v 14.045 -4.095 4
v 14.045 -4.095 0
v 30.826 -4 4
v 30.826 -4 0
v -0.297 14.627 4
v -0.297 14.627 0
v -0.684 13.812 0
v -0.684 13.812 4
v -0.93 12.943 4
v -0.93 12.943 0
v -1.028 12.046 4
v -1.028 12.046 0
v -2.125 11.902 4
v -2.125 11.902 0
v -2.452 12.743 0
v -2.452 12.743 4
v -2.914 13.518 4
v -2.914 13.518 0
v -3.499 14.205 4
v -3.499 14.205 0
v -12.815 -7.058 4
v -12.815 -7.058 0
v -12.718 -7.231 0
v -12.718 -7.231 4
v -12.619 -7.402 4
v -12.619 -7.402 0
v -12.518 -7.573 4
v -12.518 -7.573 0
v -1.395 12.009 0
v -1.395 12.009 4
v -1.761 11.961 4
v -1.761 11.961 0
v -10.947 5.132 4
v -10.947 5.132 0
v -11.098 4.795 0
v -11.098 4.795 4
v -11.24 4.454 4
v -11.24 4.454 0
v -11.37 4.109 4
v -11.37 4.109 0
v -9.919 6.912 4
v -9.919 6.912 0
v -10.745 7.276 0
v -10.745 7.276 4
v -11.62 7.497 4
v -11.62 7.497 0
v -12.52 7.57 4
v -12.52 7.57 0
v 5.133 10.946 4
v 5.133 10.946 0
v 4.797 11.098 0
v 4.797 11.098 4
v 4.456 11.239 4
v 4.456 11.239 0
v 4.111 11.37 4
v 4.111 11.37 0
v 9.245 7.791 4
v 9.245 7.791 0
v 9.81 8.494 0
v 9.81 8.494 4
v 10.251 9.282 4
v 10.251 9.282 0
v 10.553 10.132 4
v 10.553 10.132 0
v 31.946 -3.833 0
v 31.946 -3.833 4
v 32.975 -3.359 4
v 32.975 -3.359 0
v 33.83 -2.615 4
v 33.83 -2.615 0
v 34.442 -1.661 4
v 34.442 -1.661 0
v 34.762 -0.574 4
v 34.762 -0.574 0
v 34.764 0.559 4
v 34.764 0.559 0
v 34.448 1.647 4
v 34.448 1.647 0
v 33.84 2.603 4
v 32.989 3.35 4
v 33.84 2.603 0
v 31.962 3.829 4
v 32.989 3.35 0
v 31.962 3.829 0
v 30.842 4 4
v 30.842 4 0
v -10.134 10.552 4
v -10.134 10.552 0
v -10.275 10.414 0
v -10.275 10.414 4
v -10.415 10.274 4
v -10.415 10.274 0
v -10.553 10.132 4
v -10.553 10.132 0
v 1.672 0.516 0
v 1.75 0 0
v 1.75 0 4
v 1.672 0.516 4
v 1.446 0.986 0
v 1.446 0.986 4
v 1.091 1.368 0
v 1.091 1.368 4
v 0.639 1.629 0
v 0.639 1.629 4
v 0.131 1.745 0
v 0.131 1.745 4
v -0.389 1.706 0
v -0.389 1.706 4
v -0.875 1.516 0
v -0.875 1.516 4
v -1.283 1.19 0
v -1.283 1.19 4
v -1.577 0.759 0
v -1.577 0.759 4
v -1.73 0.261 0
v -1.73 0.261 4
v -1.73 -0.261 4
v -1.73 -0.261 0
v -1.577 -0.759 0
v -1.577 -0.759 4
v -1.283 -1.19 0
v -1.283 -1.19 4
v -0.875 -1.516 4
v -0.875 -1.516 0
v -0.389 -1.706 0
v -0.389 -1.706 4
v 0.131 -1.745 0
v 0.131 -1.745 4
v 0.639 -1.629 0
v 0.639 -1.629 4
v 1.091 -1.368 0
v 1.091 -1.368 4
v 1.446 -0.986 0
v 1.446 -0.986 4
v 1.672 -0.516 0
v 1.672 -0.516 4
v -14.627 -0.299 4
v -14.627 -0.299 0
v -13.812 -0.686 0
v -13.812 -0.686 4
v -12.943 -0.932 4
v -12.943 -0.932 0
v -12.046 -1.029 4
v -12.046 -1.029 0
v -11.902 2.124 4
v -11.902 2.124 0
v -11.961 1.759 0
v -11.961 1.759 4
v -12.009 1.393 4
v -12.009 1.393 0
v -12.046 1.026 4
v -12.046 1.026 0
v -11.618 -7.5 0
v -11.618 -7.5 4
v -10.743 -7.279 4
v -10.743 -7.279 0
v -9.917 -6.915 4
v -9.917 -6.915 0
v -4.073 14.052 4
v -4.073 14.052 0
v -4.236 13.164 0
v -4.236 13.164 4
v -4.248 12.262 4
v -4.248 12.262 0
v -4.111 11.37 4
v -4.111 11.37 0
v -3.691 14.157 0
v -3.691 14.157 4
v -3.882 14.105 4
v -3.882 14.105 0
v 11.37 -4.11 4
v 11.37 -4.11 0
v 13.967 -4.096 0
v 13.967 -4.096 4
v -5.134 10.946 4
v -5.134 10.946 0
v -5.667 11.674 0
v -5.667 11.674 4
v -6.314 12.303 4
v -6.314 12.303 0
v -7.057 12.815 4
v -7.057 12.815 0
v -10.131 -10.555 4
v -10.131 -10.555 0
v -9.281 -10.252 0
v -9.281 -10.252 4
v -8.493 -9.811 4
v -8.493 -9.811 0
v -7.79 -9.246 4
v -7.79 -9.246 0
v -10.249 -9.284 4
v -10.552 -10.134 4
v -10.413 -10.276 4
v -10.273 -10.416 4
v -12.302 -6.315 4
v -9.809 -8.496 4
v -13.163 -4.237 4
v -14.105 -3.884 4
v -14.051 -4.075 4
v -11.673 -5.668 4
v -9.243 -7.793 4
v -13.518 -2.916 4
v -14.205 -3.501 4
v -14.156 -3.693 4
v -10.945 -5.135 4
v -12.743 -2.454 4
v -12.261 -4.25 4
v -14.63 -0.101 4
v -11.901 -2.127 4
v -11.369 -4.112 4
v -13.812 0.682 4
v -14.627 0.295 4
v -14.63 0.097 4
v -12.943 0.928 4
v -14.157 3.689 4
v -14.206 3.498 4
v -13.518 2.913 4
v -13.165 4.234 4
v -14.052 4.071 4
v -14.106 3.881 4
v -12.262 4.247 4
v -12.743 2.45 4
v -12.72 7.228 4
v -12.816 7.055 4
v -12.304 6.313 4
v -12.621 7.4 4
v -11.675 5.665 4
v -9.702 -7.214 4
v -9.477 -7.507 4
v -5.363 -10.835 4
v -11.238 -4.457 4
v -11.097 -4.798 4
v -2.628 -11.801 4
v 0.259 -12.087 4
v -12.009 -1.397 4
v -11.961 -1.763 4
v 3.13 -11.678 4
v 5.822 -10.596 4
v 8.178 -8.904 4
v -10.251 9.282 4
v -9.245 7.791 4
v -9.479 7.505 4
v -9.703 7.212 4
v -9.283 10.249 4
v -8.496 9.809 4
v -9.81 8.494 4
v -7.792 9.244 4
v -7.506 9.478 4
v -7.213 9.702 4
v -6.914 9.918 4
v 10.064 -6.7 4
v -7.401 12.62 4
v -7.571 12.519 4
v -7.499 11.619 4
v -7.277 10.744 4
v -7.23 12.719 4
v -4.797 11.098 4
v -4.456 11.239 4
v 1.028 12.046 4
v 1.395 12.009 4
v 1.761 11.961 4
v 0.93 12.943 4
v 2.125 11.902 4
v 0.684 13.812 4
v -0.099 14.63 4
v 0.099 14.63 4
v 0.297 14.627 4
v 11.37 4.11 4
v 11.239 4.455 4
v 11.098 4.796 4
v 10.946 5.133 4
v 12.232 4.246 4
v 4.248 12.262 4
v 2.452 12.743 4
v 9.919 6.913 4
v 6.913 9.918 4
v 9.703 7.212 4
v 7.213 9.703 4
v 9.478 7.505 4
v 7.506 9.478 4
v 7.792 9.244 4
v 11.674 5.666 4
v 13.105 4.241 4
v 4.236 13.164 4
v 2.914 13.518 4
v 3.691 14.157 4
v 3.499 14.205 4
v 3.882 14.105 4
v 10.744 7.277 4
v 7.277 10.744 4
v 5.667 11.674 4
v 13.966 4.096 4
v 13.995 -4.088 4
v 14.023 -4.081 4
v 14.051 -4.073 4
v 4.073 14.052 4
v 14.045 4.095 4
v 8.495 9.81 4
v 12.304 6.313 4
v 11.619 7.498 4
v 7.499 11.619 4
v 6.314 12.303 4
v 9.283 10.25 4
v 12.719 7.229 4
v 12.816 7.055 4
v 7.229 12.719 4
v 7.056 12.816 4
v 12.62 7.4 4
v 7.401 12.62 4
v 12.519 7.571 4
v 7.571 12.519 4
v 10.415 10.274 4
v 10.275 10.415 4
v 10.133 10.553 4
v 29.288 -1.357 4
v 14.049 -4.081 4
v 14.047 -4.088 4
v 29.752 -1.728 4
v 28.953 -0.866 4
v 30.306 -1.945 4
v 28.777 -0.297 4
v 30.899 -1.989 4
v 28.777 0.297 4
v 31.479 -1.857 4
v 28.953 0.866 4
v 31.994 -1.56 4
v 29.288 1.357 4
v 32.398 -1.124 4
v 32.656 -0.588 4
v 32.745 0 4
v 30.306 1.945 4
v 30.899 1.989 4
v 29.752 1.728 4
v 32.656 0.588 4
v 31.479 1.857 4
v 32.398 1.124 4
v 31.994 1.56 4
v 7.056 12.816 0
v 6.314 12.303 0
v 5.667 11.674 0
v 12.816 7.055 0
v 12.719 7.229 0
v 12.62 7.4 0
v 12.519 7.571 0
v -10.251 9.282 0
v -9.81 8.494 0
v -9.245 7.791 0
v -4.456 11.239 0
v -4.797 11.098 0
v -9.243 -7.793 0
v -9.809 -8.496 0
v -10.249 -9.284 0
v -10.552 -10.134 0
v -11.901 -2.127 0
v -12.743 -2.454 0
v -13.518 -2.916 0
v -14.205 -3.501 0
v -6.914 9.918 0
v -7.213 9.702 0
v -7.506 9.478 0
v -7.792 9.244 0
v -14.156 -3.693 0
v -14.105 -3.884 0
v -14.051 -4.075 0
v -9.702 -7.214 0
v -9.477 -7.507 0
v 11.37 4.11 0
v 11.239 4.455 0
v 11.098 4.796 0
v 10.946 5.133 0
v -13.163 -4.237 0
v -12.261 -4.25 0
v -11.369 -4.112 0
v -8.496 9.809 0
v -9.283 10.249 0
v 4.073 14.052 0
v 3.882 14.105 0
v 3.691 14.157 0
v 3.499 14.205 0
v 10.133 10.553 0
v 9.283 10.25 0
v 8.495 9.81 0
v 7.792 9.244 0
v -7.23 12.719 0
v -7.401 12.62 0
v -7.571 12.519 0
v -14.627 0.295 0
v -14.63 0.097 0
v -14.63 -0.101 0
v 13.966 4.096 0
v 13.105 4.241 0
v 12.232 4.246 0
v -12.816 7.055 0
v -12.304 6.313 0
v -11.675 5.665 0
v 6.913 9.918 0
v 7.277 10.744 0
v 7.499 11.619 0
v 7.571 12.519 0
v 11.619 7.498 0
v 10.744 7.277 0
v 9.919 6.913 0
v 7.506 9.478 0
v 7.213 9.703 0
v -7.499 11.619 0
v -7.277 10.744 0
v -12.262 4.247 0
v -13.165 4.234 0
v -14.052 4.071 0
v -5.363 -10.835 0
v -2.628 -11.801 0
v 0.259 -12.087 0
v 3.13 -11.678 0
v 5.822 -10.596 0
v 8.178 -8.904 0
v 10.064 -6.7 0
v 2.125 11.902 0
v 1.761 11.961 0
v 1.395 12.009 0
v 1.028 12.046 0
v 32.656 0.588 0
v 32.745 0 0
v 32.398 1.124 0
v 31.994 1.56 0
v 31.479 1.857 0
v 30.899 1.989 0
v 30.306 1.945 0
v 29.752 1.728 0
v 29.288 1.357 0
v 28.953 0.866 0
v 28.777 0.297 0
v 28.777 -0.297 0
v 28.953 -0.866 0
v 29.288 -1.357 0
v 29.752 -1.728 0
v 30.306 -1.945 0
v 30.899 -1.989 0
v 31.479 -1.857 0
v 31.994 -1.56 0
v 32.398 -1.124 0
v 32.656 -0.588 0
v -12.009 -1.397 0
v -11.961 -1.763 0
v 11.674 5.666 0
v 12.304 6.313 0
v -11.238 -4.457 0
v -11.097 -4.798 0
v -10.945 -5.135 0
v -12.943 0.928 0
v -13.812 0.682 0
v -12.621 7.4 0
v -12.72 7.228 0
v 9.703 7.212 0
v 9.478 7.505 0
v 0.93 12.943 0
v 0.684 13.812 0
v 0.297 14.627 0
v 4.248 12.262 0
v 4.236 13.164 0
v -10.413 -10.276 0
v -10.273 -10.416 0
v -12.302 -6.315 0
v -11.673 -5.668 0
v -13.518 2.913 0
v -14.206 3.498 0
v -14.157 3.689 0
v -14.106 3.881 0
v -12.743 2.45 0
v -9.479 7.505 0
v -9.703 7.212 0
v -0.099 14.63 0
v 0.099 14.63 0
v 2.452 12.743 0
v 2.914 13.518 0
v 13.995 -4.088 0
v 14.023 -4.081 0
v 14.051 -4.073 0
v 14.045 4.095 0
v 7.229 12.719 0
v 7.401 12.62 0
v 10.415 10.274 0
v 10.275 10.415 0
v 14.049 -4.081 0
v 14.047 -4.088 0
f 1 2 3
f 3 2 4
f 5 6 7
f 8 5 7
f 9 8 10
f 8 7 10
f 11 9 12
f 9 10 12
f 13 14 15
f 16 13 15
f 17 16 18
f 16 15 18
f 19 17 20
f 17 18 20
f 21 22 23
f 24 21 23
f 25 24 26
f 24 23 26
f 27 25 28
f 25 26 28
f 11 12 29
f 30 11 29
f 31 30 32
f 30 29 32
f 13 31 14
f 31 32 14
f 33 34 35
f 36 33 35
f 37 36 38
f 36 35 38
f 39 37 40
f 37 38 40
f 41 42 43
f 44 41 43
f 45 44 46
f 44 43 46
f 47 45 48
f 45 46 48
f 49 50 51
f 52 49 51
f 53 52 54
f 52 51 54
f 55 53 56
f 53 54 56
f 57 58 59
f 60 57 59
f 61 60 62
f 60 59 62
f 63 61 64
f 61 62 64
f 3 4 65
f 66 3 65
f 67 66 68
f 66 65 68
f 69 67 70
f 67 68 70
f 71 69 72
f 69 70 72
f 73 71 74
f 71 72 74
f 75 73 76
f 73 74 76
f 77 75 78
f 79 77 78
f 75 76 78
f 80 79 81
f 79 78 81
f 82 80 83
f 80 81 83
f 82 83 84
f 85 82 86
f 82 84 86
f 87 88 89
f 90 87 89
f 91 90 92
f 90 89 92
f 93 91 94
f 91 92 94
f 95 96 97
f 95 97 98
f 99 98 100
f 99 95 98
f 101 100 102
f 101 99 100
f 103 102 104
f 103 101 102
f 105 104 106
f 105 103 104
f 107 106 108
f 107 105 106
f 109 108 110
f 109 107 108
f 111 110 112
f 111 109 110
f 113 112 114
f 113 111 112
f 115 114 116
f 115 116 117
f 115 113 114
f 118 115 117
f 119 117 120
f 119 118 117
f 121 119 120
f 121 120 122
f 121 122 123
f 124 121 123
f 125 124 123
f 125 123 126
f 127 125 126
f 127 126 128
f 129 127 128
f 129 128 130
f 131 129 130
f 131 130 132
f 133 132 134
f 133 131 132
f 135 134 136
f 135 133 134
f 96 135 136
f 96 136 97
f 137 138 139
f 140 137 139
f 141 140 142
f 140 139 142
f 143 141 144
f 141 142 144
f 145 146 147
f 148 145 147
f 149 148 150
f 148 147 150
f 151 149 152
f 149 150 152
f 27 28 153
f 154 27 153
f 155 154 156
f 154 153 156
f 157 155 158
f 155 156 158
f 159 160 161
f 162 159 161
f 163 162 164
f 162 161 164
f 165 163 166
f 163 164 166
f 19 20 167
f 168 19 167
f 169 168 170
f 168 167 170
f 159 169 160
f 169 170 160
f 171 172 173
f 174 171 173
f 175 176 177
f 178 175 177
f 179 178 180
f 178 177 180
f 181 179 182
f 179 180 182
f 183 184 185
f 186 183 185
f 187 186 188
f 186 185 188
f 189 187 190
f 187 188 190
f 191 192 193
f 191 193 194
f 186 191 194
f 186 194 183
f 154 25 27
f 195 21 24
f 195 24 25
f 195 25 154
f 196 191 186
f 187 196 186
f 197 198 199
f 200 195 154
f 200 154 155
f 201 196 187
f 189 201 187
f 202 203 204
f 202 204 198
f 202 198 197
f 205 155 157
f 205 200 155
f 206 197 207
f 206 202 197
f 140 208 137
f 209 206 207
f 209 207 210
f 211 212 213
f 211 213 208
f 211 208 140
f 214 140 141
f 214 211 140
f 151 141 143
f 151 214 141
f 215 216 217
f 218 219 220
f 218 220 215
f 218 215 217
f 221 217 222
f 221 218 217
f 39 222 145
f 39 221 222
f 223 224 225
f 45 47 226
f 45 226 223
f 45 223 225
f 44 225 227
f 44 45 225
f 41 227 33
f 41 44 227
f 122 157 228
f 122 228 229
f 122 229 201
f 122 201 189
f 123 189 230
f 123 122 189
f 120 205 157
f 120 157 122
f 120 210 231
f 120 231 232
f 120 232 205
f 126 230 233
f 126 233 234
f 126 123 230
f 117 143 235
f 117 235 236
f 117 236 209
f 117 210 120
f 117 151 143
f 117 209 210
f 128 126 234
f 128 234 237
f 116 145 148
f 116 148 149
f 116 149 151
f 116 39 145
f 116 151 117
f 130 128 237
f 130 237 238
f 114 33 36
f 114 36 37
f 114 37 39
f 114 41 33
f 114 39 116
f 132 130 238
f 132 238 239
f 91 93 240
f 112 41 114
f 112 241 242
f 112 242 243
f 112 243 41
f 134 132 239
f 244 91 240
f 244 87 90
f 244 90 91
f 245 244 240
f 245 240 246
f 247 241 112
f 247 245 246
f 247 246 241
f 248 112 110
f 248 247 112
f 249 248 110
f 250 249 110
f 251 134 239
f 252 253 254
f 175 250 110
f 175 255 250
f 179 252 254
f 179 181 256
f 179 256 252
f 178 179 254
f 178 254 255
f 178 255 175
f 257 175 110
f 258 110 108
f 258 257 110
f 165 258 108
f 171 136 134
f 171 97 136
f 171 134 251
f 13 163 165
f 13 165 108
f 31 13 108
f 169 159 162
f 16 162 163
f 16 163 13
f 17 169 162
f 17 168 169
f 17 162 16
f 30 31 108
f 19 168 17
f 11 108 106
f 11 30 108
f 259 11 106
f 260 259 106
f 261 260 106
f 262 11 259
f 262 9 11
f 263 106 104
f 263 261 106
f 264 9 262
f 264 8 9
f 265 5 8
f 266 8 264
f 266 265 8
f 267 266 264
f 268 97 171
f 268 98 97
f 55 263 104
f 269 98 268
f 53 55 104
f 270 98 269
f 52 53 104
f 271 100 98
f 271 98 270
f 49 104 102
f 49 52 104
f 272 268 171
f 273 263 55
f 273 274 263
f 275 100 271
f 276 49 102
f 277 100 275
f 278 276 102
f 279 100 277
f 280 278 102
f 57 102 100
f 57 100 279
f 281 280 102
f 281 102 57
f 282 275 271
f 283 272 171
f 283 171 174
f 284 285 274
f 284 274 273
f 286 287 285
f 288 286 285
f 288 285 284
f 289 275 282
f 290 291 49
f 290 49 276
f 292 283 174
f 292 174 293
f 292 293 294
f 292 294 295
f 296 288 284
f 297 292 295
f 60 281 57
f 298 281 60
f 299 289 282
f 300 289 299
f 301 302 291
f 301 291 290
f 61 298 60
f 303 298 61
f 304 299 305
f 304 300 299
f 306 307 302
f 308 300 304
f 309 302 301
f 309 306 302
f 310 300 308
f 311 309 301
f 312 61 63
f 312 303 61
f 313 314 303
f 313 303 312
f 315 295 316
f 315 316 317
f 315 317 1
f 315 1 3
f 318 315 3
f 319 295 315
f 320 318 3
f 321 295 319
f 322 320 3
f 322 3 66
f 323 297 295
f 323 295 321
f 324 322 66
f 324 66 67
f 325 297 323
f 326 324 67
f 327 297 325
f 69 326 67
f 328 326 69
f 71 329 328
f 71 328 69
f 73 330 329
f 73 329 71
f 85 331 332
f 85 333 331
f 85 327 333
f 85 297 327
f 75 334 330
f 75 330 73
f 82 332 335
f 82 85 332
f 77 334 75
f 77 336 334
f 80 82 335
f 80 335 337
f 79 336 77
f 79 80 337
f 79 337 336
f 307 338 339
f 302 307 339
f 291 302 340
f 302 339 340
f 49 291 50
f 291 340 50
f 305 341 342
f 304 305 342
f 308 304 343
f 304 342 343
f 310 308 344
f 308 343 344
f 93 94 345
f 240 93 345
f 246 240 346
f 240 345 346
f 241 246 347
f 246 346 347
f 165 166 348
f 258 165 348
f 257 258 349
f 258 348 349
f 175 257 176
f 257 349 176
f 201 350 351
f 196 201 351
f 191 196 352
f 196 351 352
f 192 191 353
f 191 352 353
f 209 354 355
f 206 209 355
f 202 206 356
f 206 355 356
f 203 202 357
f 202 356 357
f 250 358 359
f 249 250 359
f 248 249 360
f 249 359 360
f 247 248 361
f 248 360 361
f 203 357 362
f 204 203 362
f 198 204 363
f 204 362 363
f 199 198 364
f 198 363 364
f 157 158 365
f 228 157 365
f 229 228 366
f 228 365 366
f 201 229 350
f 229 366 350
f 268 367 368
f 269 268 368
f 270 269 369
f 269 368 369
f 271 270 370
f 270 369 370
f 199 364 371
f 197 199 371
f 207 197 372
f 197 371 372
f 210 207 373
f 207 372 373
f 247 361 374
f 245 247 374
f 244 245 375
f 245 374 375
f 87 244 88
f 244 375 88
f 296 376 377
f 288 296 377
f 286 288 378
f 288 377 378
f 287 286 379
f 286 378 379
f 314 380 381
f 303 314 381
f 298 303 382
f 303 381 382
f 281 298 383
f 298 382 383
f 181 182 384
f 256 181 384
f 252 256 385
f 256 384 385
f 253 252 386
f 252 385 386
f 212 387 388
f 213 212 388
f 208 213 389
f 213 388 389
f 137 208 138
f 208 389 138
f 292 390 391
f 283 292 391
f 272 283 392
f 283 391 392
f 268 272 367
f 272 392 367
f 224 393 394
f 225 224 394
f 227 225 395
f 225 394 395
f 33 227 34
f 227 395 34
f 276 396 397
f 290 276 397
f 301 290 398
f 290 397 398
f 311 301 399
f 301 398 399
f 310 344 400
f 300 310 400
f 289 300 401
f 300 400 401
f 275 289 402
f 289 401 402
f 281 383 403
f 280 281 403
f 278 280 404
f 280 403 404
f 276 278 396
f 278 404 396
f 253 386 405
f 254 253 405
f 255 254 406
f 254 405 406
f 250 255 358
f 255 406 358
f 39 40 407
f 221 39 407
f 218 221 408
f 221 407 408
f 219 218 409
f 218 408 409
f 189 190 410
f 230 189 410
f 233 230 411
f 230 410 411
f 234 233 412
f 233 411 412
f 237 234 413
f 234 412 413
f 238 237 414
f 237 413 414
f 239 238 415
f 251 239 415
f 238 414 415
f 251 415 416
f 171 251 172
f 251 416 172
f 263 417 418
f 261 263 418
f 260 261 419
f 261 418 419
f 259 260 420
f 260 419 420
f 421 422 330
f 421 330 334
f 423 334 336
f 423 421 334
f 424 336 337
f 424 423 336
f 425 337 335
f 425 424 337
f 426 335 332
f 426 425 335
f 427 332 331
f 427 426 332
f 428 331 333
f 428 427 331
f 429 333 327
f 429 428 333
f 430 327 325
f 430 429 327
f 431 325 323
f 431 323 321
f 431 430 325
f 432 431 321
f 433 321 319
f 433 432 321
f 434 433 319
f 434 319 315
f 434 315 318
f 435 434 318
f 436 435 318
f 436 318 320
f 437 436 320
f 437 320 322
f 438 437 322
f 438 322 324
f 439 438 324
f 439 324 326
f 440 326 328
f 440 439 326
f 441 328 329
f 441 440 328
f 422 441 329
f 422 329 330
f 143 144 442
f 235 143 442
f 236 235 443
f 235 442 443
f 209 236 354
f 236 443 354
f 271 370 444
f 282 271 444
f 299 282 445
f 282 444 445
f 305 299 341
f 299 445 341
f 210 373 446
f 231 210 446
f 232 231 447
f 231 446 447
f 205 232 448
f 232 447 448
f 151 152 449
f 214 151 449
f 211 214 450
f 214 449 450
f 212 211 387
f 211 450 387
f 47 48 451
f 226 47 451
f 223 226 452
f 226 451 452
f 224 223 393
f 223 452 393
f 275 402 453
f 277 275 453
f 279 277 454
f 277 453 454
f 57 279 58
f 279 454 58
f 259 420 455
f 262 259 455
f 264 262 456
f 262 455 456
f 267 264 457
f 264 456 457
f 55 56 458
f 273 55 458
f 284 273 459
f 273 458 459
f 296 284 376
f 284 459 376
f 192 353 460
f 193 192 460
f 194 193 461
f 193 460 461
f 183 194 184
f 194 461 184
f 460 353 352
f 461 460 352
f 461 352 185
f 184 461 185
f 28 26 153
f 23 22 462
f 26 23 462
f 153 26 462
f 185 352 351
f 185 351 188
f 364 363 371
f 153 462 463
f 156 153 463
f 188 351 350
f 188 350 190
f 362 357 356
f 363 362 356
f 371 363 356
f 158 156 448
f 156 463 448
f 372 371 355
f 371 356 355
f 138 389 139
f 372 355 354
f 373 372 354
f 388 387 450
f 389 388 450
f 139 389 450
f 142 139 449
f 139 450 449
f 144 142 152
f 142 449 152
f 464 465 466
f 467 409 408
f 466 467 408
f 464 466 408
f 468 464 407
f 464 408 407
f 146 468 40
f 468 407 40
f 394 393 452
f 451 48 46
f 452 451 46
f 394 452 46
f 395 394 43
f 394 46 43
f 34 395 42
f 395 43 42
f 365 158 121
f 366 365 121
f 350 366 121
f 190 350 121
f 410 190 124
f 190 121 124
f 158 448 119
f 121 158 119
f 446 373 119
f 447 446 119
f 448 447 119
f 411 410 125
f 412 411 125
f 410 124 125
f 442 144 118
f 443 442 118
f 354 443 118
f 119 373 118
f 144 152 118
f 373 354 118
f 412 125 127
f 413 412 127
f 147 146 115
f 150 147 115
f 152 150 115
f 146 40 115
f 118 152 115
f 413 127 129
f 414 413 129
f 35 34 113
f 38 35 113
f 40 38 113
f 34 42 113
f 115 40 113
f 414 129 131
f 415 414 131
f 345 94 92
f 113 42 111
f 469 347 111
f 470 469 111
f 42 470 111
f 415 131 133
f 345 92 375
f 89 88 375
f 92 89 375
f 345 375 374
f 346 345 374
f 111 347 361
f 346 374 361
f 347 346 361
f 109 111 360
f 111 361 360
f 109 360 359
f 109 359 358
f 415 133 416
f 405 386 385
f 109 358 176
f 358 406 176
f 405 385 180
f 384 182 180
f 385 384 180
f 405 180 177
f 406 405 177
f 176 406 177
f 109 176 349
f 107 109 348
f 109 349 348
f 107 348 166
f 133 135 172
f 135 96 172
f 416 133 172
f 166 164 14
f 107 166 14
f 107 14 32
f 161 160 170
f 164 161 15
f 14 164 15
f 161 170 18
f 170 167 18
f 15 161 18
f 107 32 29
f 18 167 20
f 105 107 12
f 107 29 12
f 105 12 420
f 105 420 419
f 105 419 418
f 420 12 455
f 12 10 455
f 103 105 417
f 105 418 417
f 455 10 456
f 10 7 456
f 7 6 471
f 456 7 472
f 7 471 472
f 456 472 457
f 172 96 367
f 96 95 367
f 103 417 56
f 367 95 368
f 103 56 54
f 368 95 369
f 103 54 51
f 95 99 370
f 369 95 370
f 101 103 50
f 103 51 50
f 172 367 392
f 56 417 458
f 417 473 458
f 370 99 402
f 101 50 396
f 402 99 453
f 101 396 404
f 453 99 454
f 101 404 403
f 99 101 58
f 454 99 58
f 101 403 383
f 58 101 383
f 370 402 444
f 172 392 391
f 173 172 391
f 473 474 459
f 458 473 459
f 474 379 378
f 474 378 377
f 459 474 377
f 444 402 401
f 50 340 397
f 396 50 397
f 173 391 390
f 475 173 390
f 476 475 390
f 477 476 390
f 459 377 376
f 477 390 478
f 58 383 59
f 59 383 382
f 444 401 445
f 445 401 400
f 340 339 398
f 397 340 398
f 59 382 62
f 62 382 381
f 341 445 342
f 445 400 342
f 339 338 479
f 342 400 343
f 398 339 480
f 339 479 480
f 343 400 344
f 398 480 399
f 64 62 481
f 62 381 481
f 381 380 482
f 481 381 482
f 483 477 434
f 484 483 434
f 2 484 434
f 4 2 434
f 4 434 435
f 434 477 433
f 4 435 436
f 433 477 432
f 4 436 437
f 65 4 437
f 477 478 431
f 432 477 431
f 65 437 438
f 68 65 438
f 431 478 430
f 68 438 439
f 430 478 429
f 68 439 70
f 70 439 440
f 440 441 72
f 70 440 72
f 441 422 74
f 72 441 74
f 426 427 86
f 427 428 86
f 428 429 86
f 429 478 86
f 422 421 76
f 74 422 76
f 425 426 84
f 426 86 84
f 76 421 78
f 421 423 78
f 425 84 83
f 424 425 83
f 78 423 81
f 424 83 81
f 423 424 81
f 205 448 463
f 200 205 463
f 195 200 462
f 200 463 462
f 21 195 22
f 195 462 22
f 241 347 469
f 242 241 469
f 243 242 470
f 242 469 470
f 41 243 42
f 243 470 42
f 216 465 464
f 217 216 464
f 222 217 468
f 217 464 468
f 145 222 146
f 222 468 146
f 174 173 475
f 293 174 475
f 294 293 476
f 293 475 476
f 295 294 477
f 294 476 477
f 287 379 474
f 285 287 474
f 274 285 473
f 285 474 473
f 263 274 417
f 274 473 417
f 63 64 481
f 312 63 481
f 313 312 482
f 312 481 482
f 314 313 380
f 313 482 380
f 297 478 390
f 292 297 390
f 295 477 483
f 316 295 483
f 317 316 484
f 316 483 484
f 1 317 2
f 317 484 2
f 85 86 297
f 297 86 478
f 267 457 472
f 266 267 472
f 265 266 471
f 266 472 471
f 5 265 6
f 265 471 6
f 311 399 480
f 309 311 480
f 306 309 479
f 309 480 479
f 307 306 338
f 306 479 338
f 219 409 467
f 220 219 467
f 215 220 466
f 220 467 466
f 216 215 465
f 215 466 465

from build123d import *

# Parameters (mm, degrees)
SKETCH1_R           = 12.09
SKETCH1_R_2         = 1.75
SKETCH1_R_3         = 1.995
BOSS_EXTRUDE1_DEPTH = 4


with BuildPart() as part:
    # Sketch1 → Boss-Extrude1 (new body)
    # profile 1 of 22: a face of its own
    with BuildSketch(Plane.XY):
        Circle(SKETCH1_R)
        Circle(SKETCH1_R_2, mode=Mode.SUBTRACT)
    # profile 2 of 22: a face of its own
    with BuildSketch(Plane.XY):
        with BuildLine():
            ThreePointArc((14.051469909, -4.073462091), (14.048317136, -4.084321933), (14.04515597, -4.095179336))
            Line((14.04515597, -4.095179336), (30.82582707, -3.999919373))
            ThreePointArc((30.82582707, -3.999919373), (34.803112279, -0.008027822), (30.841914591, 3.999828048))
            Line((30.841914591, 3.999828048), (14.04515597, 4.095179336))
            ThreePointArc((14.04515597, 4.095179336), (14.128586435, 3.797360314), (14.205702589, 3.497844187))
            ThreePointArc((14.205702589, 3.497844187), (14.50484412, 1.909554151), (14.626965513, 0.297959519))
            ThreePointArc((14.626965513, 0.297959519), (14.629241359, 0.148987485), (14.63, 0))
            ThreePointArc((14.63, 0), (14.629241116, -0.149011314), (14.626964543, -0.298007168))
            ThreePointArc((14.626964543, -0.298007168), (14.504858624, -1.909443973), (14.20576712, -3.497582099))
            ThreePointArc((14.20576712, -3.497582099), (14.131552306, -3.786308154), (14.051469909, -4.073462091))
        make_face()
        with Locations((30.75, 0)):
            Circle(SKETCH1_R_3, mode=Mode.SUBTRACT)
    # profile 3 of 22: a face of its own
    with BuildSketch(Plane.XY):
        with BuildLine():
            ThreePointArc((14.205702589, 3.497844187), (14.128586435, 3.797360314), (14.04515597, 4.095179336))
            Line((14.04515597, 4.095179336), (13.966164937, 4.095627749))
            Line((13.966164937, 4.095627749), (11.369827915, 4.11036655))
            ThreePointArc((11.369827915, 4.11036655), (11.678097516, 3.128919686), (11.901816808, 2.124819208))
            ThreePointArc((11.901816808, 2.124819208), (13.1403578, 2.666023245), (14.205702589, 3.497844187))
        make_face()
    # profile 4 of 22: a face of its own
    with BuildSketch(Plane.XY):
        with BuildLine():
            ThreePointArc((-12.517636695, -7.572692492), (-11.175984377, -7.407777173), (-9.917325106, -6.914821961))
            ThreePointArc((-9.917325106, -6.914821961), (-10.469253219, -6.046721181), (-10.945386333, -5.134843524))
            ThreePointArc((-10.945386333, -5.134843524), (-12.001489862, -5.978375477), (-12.815033037, -7.057749518))
            ThreePointArc((-12.815033037, -7.057749518), (-12.668951436, -7.31673216), (-12.517636695, -7.572692492))
        make_face()
    # profile 5 of 22: a face of its own
    with BuildSketch(Plane.XY):
        with BuildLine():
            ThreePointArc((-14.051145033, -4.074582586), (-12.712516328, -4.262616236), (-11.369129658, -4.112297512))
            ThreePointArc((-11.369129658, -4.112297512), (-11.677558471, -3.130930876), (-11.901445615, -2.126897335))
            ThreePointArc((-11.901445615, -2.126897335), (-13.139881298, -2.668425004), (-14.205038564, -3.500539874))
            ThreePointArc((-14.205038564, -3.500539874), (-14.13100701, -3.788342761), (-14.051145033, -4.074582586))
        make_face()
    # profile 6 of 22: a face of its own
    with BuildSketch(Plane.XY):
        with BuildLine():
            ThreePointArc((-14.626950262, -0.298707293), (-13.382615157, -0.826868574), (-12.046093246, -1.029435529))
            ThreePointArc((-12.046093246, -1.029435529), (-12.089999882, -0.001686428), (-12.046379968, 1.026074882))
            ThreePointArc((-12.046379968, 1.026074882), (-13.382791491, 0.823465153), (-14.62701917, 0.295313712))
            ThreePointArc((-14.62701917, 0.295313712), (-14.629999902, -0.00169714), (-14.626950262, -0.298707293))
        make_face()
    # profile 7 of 22: a face of its own
    with BuildSketch(Plane.XY):
        with BuildLine():
            ThreePointArc((-14.205774364, 3.497552675), (-13.140565234, 2.66528054), (-11.902026335, 2.123645243))
            ThreePointArc((-11.902026335, 2.123645243), (-11.678416405, 3.127729251), (-11.370260409, 4.109170017))
            ThreePointArc((-11.370260409, 4.109170017), (-12.71360248, 4.259309779), (-14.052145793, 4.071129894))
            ThreePointArc((-14.052145793, 4.071129894), (-14.131870386, 3.78512079), (-14.205774364, 3.497552675))
        make_face()
    # profile 8 of 22: a face of its own
    with BuildSketch(Plane.XY):
        with BuildLine():
            ThreePointArc((-9.919135011, 6.912225448), (-11.177872267, 7.404913556), (-12.519533027, 7.569556974))
            ThreePointArc((-12.519533027, 7.569556974), (-12.670533379, 7.313992337), (-12.816317544, 7.055416686))
            ThreePointArc((-12.816317544, 7.055416686), (-12.00284137, 5.975783406), (-10.94671211, 5.132016561))
            ThreePointArc((-10.94671211, 5.132016561), (-10.470825179, 6.043998682), (-9.919135011, 6.912225448))
        make_face()
    # profile 9 of 22: a face of its own
    with BuildSketch(Plane.XY):
        with BuildLine():
            ThreePointArc((-7.791898403, 9.244155952), (-8.880242473, 10.045843984), (-10.13359017, 10.552120653))
            ThreePointArc((-10.13359017, 10.552120653), (-10.345575707, 10.344368676), (-10.553302948, 10.1323589))
            ThreePointArc((-10.553302948, 10.1323589), (-10.04699158, 8.878969486), (-9.245249077, 7.790601357))
            ThreePointArc((-9.245249077, 7.790601357), (-8.549520677, 8.54832125), (-7.791898403, 9.244155952))
        make_face()
    # profile 10 of 22: a face of its own
    with BuildSketch(Plane.XY):
        with BuildLine():
            ThreePointArc((-5.133551517, 10.945992364), (-5.977311447, 12.002061971), (-7.05691548, 12.815492339))
            ThreePointArc((-7.05691548, 12.815492339), (-7.315469666, 12.669680484), (-7.571012334, 12.518652972))
            ThreePointArc((-7.571012334, 12.518652972), (-7.40634855, 11.176941958), (-6.913615931, 9.918165897))
            ThreePointArc((-6.913615931, 9.918165897), (-6.045466706, 10.469977665), (-5.133551517, 10.945992364))
        make_face()
    # profile 11 of 22: a face of its own
    with BuildSketch(Plane.XY):
        with BuildLine():
            ThreePointArc((-2.125311093, 11.901728982), (-2.666957342, 13.14020836), (-3.499215334, 14.205364904))
            ThreePointArc((-3.499215334, 14.205364904), (-3.786765286, 14.131429817), (-4.072755654, 14.051674682))
            ThreePointArc((-4.072755654, 14.051674682), (-4.260931239, 12.713077321), (-4.110760617, 11.369685446))
            ThreePointArc((-4.110760617, 11.369685446), (-3.129363382, 11.677978627), (-2.125311093, 11.901728982))
        make_face()
    # profile 12 of 22: a face of its own
    with BuildSketch(Plane.XY):
        with BuildLine():
            ThreePointArc((1.027754616, 12.046236775), (0.825159863, 13.382704508), (0.296996585, 14.626985097))
            ThreePointArc((0.296996585, 14.626985097), (0, 14.63), (-0.296996585, 14.626985097))
            ThreePointArc((-0.296996585, 14.626985097), (-0.825159863, 13.382704508), (-1.027754616, 12.046236775))
            ThreePointArc((-1.027754616, 12.046236775), (0, 12.09), (1.027754616, 12.046236775))
        make_face()
    # profile 13 of 22: a face of its own
    with BuildSketch(Plane.XY):
        with BuildLine():
            ThreePointArc((4.110717434, 11.369701059), (4.260994095, 12.713043392), (4.072942889, 14.051620413))
            ThreePointArc((4.072942889, 14.051620413), (3.786710214, 14.131444574), (3.498915331, 14.2054388))
            ThreePointArc((3.498915331, 14.2054388), (2.666773966, 13.14023428), (2.125244746, 11.901740829))
            ThreePointArc((2.125244746, 11.901740829), (3.129308654, 11.677993293), (4.110717434, 11.369701059))
        make_face()
    # profile 14 of 22: a face of its own
    with BuildSketch(Plane.XY):
        with BuildLine():
            ThreePointArc((6.913450185, 9.91828143), (7.406352802, 11.176909529), (7.571236986, 12.518517105))
            ThreePointArc((7.571236986, 12.518517105), (7.315275528, 12.669792577), (7.056292749, 12.81583523))
            ThreePointArc((7.056292749, 12.81583523), (5.976880257, 12.002254067), (5.133331053, 10.946095756))
            ThreePointArc((5.133331053, 10.946095756), (6.045273784, 10.470089058), (6.913450185, 9.91828143))
        make_face()
    # profile 15 of 22: a face of its own
    with BuildSketch(Plane.XY):
        with BuildLine():
            ThreePointArc((9.244954117, 7.790951378), (10.046869152, 8.879052728), (10.553440202, 10.132215942))
            ThreePointArc((10.553440202, 10.132215942), (10.345229175, 10.344715236), (10.132740224, 10.552936821))
            ThreePointArc((10.132740224, 10.552936821), (8.879594749, 10.046380548), (7.791503622, 9.244488699))
            ThreePointArc((7.791503622, 9.244488699), (8.549176321, 8.548665641), (9.244954117, 7.790951378))
        make_face()
    # profile 16 of 22: a face of its own
    with BuildSketch(Plane.XY):
        with BuildLine():
            ThreePointArc((10.946374382, 5.132736881), (12.002615026, 5.976132183), (12.81632055, 7.055411226))
            ThreePointArc((12.81632055, 7.055411226), (12.670115094, 7.314716911), (12.518663963, 7.570994161))
            ThreePointArc((12.518663963, 7.570994161), (11.17714698, 7.405952739), (9.918639175, 6.912936924))
            ThreePointArc((9.918639175, 6.912936924), (10.47040953, 6.044718709), (10.946374382, 5.132736881))
        make_face()
    # profile 17 of 22: a face of its own
    with BuildSketch(Plane.XY):
        with BuildLine():
            ThreePointArc((12.046231207, -1.027819886), (11.986581537, -1.577961676), (11.901820644, -2.124797724))
            ThreePointArc((11.901820644, -2.124797724), (13.140374441, -2.665881604), (14.20576712, -3.497582099))
            ThreePointArc((14.20576712, -3.497582099), (14.504858624, -1.909443973), (14.626964543, -0.298007168))
            ThreePointArc((14.626964543, -0.298007168), (13.382627003, -0.825679814), (12.046231207, -1.027819886))
        make_face()
    # profile 18 of 22: a face of its own
    with BuildSketch(Plane.XY):
        with BuildLine():
            ThreePointArc((11.901820644, -2.124797724), (11.67810034, -3.128909147), (11.369827915, -4.11036655))
            Line((11.369827915, -4.11036655), (13.967019497, -4.095622898))
            ThreePointArc((13.967019497, -4.095622898), (14.009289492, -4.084713176), (14.051469909, -4.073462091))
            ThreePointArc((14.051469909, -4.073462091), (14.131552306, -3.786308154), (14.20576712, -3.497582099))
            ThreePointArc((14.20576712, -3.497582099), (13.140374441, -2.665881604), (11.901820644, -2.124797724))
        make_face()
    # profile 19 of 22: a face of its own
    with BuildSketch(Plane.XY):
        with BuildLine():
            ThreePointArc((12.09, 0), (12.079052845, -0.514375696), (12.046231207, -1.027819886))
            ThreePointArc((12.046231207, -1.027819886), (13.382627003, -0.825679814), (14.626964543, -0.298007168))
            ThreePointArc((14.626964543, -0.298007168), (14.629241116, -0.149011314), (14.63, 0))
            ThreePointArc((14.63, 0), (14.629241359, 0.148987485), (14.626965513, 0.297959519))
            ThreePointArc((14.626965513, 0.297959519), (13.382629481, 0.825632028), (12.046235232, 1.027772701))
            ThreePointArc((12.046235232, 1.027772701), (12.079053853, 0.514352039), (12.09, 0))
        make_face()
    # profile 20 of 22: a face of its own
    with BuildSketch(Plane.XY):
        with BuildLine():
            ThreePointArc((11.901816808, 2.124819208), (11.986583203, 1.577949019), (12.046235232, 1.027772701))
            ThreePointArc((12.046235232, 1.027772701), (13.382629481, 0.825632028), (14.626965513, 0.297959519))
            ThreePointArc((14.626965513, 0.297959519), (14.50484412, 1.909554151), (14.205702589, 3.497844187))
            ThreePointArc((14.205702589, 3.497844187), (13.1403578, 2.666023245), (11.901816808, 2.124819208))
        make_face()
    # profile 21 of 22: a face of its own
    with BuildSketch(Plane.XY):
        with BuildLine():
            Line((11.369827915, 4.11036655), (13.966164937, 4.095627749))
            ThreePointArc((13.966164937, 4.095627749), (12.668895431, 4.261362771), (11.369827915, 4.11036655))
        make_face()
    # profile 22 of 22: a face of its own
    with BuildSketch(Plane.XY):
        with BuildLine():
            ThreePointArc((-10.130994605, -10.554612656), (-8.877796666, -10.047999865), (-7.789679206, -9.246026058))
            ThreePointArc((-7.789679206, -9.246026058), (-8.547489799, -8.550351931), (-9.243417598, -7.792774288))
            ThreePointArc((-9.243417598, -7.792774288), (-10.045261463, -8.880834456), (-10.55179143, -10.133932978))
            ThreePointArc((-10.55179143, -10.133932978), (-10.343531911, -10.346412306), (-10.130994605, -10.554612656))
        make_face()
    extrude(amount=BOSS_EXTRUDE1_DEPTH)


solid = part.part
